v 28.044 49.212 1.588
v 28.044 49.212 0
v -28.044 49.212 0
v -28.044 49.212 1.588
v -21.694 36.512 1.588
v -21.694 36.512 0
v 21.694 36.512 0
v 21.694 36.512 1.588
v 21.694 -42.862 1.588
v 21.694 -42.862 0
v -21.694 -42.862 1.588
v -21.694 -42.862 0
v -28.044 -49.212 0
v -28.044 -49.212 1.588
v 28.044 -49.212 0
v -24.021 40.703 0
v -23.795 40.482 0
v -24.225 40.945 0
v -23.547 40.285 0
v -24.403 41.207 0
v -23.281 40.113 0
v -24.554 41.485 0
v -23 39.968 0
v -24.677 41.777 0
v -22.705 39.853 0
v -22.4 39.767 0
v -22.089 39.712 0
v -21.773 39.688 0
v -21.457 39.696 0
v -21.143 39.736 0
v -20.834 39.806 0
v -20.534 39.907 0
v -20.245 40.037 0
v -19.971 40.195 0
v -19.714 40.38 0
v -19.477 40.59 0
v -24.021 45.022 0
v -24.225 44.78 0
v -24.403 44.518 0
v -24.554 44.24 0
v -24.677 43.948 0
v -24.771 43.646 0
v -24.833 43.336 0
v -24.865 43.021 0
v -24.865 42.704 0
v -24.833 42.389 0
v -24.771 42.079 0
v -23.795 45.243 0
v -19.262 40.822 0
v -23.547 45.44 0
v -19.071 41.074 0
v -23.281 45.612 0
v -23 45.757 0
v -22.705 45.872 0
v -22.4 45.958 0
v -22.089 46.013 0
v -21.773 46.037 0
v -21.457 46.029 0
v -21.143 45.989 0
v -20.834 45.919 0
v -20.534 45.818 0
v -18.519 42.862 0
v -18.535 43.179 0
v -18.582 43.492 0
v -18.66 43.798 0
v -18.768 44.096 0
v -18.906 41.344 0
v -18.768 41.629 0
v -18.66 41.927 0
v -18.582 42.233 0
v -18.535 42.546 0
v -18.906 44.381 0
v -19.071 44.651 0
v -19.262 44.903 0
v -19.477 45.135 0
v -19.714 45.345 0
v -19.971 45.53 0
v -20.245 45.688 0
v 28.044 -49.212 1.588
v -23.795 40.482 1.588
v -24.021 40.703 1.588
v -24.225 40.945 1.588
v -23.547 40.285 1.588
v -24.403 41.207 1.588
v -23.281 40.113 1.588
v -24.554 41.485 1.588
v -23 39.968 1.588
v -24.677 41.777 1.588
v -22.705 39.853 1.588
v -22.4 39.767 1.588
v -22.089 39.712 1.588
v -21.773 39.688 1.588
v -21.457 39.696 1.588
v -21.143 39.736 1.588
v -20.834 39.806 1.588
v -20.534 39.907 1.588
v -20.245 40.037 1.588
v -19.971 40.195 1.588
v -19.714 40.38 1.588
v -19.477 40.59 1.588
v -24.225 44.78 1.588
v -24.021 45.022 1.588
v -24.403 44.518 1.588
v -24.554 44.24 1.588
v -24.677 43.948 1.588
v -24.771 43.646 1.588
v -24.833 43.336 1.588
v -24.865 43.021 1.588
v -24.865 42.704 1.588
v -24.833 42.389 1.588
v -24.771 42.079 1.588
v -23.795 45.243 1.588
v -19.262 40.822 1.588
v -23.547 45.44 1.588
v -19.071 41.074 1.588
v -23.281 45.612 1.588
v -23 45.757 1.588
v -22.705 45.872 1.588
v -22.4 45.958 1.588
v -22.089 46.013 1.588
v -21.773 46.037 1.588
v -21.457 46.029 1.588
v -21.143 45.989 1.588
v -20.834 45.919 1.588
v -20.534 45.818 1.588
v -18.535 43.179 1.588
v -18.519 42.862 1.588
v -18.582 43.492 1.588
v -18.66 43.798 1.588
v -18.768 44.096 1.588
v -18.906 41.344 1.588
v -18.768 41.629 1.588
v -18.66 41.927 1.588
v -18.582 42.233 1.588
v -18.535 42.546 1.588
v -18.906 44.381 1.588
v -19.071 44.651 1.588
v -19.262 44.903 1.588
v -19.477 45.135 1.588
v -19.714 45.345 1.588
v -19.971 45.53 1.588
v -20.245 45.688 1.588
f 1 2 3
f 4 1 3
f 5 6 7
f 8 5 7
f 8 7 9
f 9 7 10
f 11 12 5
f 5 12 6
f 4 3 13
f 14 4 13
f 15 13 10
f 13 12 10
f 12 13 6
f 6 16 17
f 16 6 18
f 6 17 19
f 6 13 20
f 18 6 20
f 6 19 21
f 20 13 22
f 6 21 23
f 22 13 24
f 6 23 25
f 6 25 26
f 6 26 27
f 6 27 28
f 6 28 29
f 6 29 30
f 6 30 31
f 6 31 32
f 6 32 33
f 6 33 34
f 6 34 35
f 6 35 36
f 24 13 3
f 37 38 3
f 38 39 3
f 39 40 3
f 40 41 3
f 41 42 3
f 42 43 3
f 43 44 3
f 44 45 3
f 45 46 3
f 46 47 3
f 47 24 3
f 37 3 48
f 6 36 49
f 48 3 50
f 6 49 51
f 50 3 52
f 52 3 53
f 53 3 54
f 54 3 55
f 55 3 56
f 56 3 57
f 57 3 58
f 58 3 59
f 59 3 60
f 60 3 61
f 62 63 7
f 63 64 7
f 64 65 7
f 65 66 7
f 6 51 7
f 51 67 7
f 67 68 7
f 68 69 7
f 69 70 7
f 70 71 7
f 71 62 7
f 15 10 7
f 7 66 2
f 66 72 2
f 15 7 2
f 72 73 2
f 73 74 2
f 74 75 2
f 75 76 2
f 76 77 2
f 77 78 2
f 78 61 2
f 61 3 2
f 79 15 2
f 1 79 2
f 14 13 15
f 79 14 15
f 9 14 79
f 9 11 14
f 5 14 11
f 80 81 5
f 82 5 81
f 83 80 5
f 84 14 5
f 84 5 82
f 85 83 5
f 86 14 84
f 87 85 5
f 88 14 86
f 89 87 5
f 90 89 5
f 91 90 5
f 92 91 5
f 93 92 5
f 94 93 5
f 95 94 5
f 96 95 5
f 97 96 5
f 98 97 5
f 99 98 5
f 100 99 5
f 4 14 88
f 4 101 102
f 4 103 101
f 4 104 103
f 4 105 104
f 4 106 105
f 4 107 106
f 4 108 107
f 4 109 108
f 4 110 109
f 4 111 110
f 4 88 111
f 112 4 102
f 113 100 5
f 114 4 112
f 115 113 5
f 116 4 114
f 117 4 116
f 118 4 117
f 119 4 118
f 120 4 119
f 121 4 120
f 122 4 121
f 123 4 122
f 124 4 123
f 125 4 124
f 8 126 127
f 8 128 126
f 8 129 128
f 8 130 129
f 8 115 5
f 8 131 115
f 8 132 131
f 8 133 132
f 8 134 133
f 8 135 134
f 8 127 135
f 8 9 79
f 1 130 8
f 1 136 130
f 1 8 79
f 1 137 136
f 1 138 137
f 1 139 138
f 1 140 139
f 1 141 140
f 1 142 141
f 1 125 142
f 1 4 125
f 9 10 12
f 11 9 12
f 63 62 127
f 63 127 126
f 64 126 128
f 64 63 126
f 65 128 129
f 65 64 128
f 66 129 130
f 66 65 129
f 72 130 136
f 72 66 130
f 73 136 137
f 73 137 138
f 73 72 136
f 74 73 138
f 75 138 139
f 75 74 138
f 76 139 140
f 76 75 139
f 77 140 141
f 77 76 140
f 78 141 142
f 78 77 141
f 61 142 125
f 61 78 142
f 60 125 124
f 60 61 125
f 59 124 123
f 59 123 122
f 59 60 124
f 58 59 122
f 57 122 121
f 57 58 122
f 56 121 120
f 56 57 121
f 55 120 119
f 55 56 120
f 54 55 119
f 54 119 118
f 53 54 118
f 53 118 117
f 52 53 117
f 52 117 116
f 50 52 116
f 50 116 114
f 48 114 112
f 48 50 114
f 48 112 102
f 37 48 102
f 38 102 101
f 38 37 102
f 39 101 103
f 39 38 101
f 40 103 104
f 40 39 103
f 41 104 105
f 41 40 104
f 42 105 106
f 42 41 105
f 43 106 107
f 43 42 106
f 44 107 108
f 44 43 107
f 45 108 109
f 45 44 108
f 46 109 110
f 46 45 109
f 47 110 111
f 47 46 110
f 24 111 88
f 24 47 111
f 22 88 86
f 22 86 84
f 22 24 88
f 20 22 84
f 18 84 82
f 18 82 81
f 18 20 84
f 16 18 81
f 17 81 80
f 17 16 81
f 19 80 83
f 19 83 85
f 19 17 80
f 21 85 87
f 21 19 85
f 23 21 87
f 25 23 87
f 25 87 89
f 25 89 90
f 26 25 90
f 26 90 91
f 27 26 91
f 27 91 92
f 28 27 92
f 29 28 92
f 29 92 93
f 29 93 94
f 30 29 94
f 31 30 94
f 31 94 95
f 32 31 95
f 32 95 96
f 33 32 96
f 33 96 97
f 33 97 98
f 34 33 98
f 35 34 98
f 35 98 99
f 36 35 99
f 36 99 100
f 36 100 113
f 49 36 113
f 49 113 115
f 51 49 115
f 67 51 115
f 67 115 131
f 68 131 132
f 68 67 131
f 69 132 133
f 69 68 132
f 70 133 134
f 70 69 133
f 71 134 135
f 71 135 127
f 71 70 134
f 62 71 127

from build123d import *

# Parameters (mm, degrees)
F0_R     = 3.175
F1_DEPTH = 1.5875


with BuildPart() as f1:
    # F0 (on Top) → F1 (new body)
    with BuildSketch(Plane.XY):
        Polygon((21.693888, -42.8625), (21.693888, 0), (21.693888, 36.5125), (0, 36.5125), (-21.693888, 36.5125), (-21.693888, 0), (-21.693888, -42.8625), (0, -42.8625), align=None)
        Polygon((-28.043888, -49.2125), (28.043888, -49.2125), (28.043888, 0), (28.043888, 35.28102), (28.043888, 49.2125), (0, 49.2125), (-28.043888, 49.2125), (-28.043888, 35.28102), align=None)
        Polygon((21.693888, 36.5125), (21.693888, 0), (21.693888, -42.8625), (0, -42.8625), (-21.693888, -42.8625), (-21.693888, 0), (-21.693888, 36.5125), (0, 36.5125), align=None, mode=Mode.SUBTRACT)
        with Locations((-21.693888, 42.8625)):
            Circle(F0_R, mode=Mode.SUBTRACT)
    extrude(amount=F1_DEPTH)


solid = f1.part
